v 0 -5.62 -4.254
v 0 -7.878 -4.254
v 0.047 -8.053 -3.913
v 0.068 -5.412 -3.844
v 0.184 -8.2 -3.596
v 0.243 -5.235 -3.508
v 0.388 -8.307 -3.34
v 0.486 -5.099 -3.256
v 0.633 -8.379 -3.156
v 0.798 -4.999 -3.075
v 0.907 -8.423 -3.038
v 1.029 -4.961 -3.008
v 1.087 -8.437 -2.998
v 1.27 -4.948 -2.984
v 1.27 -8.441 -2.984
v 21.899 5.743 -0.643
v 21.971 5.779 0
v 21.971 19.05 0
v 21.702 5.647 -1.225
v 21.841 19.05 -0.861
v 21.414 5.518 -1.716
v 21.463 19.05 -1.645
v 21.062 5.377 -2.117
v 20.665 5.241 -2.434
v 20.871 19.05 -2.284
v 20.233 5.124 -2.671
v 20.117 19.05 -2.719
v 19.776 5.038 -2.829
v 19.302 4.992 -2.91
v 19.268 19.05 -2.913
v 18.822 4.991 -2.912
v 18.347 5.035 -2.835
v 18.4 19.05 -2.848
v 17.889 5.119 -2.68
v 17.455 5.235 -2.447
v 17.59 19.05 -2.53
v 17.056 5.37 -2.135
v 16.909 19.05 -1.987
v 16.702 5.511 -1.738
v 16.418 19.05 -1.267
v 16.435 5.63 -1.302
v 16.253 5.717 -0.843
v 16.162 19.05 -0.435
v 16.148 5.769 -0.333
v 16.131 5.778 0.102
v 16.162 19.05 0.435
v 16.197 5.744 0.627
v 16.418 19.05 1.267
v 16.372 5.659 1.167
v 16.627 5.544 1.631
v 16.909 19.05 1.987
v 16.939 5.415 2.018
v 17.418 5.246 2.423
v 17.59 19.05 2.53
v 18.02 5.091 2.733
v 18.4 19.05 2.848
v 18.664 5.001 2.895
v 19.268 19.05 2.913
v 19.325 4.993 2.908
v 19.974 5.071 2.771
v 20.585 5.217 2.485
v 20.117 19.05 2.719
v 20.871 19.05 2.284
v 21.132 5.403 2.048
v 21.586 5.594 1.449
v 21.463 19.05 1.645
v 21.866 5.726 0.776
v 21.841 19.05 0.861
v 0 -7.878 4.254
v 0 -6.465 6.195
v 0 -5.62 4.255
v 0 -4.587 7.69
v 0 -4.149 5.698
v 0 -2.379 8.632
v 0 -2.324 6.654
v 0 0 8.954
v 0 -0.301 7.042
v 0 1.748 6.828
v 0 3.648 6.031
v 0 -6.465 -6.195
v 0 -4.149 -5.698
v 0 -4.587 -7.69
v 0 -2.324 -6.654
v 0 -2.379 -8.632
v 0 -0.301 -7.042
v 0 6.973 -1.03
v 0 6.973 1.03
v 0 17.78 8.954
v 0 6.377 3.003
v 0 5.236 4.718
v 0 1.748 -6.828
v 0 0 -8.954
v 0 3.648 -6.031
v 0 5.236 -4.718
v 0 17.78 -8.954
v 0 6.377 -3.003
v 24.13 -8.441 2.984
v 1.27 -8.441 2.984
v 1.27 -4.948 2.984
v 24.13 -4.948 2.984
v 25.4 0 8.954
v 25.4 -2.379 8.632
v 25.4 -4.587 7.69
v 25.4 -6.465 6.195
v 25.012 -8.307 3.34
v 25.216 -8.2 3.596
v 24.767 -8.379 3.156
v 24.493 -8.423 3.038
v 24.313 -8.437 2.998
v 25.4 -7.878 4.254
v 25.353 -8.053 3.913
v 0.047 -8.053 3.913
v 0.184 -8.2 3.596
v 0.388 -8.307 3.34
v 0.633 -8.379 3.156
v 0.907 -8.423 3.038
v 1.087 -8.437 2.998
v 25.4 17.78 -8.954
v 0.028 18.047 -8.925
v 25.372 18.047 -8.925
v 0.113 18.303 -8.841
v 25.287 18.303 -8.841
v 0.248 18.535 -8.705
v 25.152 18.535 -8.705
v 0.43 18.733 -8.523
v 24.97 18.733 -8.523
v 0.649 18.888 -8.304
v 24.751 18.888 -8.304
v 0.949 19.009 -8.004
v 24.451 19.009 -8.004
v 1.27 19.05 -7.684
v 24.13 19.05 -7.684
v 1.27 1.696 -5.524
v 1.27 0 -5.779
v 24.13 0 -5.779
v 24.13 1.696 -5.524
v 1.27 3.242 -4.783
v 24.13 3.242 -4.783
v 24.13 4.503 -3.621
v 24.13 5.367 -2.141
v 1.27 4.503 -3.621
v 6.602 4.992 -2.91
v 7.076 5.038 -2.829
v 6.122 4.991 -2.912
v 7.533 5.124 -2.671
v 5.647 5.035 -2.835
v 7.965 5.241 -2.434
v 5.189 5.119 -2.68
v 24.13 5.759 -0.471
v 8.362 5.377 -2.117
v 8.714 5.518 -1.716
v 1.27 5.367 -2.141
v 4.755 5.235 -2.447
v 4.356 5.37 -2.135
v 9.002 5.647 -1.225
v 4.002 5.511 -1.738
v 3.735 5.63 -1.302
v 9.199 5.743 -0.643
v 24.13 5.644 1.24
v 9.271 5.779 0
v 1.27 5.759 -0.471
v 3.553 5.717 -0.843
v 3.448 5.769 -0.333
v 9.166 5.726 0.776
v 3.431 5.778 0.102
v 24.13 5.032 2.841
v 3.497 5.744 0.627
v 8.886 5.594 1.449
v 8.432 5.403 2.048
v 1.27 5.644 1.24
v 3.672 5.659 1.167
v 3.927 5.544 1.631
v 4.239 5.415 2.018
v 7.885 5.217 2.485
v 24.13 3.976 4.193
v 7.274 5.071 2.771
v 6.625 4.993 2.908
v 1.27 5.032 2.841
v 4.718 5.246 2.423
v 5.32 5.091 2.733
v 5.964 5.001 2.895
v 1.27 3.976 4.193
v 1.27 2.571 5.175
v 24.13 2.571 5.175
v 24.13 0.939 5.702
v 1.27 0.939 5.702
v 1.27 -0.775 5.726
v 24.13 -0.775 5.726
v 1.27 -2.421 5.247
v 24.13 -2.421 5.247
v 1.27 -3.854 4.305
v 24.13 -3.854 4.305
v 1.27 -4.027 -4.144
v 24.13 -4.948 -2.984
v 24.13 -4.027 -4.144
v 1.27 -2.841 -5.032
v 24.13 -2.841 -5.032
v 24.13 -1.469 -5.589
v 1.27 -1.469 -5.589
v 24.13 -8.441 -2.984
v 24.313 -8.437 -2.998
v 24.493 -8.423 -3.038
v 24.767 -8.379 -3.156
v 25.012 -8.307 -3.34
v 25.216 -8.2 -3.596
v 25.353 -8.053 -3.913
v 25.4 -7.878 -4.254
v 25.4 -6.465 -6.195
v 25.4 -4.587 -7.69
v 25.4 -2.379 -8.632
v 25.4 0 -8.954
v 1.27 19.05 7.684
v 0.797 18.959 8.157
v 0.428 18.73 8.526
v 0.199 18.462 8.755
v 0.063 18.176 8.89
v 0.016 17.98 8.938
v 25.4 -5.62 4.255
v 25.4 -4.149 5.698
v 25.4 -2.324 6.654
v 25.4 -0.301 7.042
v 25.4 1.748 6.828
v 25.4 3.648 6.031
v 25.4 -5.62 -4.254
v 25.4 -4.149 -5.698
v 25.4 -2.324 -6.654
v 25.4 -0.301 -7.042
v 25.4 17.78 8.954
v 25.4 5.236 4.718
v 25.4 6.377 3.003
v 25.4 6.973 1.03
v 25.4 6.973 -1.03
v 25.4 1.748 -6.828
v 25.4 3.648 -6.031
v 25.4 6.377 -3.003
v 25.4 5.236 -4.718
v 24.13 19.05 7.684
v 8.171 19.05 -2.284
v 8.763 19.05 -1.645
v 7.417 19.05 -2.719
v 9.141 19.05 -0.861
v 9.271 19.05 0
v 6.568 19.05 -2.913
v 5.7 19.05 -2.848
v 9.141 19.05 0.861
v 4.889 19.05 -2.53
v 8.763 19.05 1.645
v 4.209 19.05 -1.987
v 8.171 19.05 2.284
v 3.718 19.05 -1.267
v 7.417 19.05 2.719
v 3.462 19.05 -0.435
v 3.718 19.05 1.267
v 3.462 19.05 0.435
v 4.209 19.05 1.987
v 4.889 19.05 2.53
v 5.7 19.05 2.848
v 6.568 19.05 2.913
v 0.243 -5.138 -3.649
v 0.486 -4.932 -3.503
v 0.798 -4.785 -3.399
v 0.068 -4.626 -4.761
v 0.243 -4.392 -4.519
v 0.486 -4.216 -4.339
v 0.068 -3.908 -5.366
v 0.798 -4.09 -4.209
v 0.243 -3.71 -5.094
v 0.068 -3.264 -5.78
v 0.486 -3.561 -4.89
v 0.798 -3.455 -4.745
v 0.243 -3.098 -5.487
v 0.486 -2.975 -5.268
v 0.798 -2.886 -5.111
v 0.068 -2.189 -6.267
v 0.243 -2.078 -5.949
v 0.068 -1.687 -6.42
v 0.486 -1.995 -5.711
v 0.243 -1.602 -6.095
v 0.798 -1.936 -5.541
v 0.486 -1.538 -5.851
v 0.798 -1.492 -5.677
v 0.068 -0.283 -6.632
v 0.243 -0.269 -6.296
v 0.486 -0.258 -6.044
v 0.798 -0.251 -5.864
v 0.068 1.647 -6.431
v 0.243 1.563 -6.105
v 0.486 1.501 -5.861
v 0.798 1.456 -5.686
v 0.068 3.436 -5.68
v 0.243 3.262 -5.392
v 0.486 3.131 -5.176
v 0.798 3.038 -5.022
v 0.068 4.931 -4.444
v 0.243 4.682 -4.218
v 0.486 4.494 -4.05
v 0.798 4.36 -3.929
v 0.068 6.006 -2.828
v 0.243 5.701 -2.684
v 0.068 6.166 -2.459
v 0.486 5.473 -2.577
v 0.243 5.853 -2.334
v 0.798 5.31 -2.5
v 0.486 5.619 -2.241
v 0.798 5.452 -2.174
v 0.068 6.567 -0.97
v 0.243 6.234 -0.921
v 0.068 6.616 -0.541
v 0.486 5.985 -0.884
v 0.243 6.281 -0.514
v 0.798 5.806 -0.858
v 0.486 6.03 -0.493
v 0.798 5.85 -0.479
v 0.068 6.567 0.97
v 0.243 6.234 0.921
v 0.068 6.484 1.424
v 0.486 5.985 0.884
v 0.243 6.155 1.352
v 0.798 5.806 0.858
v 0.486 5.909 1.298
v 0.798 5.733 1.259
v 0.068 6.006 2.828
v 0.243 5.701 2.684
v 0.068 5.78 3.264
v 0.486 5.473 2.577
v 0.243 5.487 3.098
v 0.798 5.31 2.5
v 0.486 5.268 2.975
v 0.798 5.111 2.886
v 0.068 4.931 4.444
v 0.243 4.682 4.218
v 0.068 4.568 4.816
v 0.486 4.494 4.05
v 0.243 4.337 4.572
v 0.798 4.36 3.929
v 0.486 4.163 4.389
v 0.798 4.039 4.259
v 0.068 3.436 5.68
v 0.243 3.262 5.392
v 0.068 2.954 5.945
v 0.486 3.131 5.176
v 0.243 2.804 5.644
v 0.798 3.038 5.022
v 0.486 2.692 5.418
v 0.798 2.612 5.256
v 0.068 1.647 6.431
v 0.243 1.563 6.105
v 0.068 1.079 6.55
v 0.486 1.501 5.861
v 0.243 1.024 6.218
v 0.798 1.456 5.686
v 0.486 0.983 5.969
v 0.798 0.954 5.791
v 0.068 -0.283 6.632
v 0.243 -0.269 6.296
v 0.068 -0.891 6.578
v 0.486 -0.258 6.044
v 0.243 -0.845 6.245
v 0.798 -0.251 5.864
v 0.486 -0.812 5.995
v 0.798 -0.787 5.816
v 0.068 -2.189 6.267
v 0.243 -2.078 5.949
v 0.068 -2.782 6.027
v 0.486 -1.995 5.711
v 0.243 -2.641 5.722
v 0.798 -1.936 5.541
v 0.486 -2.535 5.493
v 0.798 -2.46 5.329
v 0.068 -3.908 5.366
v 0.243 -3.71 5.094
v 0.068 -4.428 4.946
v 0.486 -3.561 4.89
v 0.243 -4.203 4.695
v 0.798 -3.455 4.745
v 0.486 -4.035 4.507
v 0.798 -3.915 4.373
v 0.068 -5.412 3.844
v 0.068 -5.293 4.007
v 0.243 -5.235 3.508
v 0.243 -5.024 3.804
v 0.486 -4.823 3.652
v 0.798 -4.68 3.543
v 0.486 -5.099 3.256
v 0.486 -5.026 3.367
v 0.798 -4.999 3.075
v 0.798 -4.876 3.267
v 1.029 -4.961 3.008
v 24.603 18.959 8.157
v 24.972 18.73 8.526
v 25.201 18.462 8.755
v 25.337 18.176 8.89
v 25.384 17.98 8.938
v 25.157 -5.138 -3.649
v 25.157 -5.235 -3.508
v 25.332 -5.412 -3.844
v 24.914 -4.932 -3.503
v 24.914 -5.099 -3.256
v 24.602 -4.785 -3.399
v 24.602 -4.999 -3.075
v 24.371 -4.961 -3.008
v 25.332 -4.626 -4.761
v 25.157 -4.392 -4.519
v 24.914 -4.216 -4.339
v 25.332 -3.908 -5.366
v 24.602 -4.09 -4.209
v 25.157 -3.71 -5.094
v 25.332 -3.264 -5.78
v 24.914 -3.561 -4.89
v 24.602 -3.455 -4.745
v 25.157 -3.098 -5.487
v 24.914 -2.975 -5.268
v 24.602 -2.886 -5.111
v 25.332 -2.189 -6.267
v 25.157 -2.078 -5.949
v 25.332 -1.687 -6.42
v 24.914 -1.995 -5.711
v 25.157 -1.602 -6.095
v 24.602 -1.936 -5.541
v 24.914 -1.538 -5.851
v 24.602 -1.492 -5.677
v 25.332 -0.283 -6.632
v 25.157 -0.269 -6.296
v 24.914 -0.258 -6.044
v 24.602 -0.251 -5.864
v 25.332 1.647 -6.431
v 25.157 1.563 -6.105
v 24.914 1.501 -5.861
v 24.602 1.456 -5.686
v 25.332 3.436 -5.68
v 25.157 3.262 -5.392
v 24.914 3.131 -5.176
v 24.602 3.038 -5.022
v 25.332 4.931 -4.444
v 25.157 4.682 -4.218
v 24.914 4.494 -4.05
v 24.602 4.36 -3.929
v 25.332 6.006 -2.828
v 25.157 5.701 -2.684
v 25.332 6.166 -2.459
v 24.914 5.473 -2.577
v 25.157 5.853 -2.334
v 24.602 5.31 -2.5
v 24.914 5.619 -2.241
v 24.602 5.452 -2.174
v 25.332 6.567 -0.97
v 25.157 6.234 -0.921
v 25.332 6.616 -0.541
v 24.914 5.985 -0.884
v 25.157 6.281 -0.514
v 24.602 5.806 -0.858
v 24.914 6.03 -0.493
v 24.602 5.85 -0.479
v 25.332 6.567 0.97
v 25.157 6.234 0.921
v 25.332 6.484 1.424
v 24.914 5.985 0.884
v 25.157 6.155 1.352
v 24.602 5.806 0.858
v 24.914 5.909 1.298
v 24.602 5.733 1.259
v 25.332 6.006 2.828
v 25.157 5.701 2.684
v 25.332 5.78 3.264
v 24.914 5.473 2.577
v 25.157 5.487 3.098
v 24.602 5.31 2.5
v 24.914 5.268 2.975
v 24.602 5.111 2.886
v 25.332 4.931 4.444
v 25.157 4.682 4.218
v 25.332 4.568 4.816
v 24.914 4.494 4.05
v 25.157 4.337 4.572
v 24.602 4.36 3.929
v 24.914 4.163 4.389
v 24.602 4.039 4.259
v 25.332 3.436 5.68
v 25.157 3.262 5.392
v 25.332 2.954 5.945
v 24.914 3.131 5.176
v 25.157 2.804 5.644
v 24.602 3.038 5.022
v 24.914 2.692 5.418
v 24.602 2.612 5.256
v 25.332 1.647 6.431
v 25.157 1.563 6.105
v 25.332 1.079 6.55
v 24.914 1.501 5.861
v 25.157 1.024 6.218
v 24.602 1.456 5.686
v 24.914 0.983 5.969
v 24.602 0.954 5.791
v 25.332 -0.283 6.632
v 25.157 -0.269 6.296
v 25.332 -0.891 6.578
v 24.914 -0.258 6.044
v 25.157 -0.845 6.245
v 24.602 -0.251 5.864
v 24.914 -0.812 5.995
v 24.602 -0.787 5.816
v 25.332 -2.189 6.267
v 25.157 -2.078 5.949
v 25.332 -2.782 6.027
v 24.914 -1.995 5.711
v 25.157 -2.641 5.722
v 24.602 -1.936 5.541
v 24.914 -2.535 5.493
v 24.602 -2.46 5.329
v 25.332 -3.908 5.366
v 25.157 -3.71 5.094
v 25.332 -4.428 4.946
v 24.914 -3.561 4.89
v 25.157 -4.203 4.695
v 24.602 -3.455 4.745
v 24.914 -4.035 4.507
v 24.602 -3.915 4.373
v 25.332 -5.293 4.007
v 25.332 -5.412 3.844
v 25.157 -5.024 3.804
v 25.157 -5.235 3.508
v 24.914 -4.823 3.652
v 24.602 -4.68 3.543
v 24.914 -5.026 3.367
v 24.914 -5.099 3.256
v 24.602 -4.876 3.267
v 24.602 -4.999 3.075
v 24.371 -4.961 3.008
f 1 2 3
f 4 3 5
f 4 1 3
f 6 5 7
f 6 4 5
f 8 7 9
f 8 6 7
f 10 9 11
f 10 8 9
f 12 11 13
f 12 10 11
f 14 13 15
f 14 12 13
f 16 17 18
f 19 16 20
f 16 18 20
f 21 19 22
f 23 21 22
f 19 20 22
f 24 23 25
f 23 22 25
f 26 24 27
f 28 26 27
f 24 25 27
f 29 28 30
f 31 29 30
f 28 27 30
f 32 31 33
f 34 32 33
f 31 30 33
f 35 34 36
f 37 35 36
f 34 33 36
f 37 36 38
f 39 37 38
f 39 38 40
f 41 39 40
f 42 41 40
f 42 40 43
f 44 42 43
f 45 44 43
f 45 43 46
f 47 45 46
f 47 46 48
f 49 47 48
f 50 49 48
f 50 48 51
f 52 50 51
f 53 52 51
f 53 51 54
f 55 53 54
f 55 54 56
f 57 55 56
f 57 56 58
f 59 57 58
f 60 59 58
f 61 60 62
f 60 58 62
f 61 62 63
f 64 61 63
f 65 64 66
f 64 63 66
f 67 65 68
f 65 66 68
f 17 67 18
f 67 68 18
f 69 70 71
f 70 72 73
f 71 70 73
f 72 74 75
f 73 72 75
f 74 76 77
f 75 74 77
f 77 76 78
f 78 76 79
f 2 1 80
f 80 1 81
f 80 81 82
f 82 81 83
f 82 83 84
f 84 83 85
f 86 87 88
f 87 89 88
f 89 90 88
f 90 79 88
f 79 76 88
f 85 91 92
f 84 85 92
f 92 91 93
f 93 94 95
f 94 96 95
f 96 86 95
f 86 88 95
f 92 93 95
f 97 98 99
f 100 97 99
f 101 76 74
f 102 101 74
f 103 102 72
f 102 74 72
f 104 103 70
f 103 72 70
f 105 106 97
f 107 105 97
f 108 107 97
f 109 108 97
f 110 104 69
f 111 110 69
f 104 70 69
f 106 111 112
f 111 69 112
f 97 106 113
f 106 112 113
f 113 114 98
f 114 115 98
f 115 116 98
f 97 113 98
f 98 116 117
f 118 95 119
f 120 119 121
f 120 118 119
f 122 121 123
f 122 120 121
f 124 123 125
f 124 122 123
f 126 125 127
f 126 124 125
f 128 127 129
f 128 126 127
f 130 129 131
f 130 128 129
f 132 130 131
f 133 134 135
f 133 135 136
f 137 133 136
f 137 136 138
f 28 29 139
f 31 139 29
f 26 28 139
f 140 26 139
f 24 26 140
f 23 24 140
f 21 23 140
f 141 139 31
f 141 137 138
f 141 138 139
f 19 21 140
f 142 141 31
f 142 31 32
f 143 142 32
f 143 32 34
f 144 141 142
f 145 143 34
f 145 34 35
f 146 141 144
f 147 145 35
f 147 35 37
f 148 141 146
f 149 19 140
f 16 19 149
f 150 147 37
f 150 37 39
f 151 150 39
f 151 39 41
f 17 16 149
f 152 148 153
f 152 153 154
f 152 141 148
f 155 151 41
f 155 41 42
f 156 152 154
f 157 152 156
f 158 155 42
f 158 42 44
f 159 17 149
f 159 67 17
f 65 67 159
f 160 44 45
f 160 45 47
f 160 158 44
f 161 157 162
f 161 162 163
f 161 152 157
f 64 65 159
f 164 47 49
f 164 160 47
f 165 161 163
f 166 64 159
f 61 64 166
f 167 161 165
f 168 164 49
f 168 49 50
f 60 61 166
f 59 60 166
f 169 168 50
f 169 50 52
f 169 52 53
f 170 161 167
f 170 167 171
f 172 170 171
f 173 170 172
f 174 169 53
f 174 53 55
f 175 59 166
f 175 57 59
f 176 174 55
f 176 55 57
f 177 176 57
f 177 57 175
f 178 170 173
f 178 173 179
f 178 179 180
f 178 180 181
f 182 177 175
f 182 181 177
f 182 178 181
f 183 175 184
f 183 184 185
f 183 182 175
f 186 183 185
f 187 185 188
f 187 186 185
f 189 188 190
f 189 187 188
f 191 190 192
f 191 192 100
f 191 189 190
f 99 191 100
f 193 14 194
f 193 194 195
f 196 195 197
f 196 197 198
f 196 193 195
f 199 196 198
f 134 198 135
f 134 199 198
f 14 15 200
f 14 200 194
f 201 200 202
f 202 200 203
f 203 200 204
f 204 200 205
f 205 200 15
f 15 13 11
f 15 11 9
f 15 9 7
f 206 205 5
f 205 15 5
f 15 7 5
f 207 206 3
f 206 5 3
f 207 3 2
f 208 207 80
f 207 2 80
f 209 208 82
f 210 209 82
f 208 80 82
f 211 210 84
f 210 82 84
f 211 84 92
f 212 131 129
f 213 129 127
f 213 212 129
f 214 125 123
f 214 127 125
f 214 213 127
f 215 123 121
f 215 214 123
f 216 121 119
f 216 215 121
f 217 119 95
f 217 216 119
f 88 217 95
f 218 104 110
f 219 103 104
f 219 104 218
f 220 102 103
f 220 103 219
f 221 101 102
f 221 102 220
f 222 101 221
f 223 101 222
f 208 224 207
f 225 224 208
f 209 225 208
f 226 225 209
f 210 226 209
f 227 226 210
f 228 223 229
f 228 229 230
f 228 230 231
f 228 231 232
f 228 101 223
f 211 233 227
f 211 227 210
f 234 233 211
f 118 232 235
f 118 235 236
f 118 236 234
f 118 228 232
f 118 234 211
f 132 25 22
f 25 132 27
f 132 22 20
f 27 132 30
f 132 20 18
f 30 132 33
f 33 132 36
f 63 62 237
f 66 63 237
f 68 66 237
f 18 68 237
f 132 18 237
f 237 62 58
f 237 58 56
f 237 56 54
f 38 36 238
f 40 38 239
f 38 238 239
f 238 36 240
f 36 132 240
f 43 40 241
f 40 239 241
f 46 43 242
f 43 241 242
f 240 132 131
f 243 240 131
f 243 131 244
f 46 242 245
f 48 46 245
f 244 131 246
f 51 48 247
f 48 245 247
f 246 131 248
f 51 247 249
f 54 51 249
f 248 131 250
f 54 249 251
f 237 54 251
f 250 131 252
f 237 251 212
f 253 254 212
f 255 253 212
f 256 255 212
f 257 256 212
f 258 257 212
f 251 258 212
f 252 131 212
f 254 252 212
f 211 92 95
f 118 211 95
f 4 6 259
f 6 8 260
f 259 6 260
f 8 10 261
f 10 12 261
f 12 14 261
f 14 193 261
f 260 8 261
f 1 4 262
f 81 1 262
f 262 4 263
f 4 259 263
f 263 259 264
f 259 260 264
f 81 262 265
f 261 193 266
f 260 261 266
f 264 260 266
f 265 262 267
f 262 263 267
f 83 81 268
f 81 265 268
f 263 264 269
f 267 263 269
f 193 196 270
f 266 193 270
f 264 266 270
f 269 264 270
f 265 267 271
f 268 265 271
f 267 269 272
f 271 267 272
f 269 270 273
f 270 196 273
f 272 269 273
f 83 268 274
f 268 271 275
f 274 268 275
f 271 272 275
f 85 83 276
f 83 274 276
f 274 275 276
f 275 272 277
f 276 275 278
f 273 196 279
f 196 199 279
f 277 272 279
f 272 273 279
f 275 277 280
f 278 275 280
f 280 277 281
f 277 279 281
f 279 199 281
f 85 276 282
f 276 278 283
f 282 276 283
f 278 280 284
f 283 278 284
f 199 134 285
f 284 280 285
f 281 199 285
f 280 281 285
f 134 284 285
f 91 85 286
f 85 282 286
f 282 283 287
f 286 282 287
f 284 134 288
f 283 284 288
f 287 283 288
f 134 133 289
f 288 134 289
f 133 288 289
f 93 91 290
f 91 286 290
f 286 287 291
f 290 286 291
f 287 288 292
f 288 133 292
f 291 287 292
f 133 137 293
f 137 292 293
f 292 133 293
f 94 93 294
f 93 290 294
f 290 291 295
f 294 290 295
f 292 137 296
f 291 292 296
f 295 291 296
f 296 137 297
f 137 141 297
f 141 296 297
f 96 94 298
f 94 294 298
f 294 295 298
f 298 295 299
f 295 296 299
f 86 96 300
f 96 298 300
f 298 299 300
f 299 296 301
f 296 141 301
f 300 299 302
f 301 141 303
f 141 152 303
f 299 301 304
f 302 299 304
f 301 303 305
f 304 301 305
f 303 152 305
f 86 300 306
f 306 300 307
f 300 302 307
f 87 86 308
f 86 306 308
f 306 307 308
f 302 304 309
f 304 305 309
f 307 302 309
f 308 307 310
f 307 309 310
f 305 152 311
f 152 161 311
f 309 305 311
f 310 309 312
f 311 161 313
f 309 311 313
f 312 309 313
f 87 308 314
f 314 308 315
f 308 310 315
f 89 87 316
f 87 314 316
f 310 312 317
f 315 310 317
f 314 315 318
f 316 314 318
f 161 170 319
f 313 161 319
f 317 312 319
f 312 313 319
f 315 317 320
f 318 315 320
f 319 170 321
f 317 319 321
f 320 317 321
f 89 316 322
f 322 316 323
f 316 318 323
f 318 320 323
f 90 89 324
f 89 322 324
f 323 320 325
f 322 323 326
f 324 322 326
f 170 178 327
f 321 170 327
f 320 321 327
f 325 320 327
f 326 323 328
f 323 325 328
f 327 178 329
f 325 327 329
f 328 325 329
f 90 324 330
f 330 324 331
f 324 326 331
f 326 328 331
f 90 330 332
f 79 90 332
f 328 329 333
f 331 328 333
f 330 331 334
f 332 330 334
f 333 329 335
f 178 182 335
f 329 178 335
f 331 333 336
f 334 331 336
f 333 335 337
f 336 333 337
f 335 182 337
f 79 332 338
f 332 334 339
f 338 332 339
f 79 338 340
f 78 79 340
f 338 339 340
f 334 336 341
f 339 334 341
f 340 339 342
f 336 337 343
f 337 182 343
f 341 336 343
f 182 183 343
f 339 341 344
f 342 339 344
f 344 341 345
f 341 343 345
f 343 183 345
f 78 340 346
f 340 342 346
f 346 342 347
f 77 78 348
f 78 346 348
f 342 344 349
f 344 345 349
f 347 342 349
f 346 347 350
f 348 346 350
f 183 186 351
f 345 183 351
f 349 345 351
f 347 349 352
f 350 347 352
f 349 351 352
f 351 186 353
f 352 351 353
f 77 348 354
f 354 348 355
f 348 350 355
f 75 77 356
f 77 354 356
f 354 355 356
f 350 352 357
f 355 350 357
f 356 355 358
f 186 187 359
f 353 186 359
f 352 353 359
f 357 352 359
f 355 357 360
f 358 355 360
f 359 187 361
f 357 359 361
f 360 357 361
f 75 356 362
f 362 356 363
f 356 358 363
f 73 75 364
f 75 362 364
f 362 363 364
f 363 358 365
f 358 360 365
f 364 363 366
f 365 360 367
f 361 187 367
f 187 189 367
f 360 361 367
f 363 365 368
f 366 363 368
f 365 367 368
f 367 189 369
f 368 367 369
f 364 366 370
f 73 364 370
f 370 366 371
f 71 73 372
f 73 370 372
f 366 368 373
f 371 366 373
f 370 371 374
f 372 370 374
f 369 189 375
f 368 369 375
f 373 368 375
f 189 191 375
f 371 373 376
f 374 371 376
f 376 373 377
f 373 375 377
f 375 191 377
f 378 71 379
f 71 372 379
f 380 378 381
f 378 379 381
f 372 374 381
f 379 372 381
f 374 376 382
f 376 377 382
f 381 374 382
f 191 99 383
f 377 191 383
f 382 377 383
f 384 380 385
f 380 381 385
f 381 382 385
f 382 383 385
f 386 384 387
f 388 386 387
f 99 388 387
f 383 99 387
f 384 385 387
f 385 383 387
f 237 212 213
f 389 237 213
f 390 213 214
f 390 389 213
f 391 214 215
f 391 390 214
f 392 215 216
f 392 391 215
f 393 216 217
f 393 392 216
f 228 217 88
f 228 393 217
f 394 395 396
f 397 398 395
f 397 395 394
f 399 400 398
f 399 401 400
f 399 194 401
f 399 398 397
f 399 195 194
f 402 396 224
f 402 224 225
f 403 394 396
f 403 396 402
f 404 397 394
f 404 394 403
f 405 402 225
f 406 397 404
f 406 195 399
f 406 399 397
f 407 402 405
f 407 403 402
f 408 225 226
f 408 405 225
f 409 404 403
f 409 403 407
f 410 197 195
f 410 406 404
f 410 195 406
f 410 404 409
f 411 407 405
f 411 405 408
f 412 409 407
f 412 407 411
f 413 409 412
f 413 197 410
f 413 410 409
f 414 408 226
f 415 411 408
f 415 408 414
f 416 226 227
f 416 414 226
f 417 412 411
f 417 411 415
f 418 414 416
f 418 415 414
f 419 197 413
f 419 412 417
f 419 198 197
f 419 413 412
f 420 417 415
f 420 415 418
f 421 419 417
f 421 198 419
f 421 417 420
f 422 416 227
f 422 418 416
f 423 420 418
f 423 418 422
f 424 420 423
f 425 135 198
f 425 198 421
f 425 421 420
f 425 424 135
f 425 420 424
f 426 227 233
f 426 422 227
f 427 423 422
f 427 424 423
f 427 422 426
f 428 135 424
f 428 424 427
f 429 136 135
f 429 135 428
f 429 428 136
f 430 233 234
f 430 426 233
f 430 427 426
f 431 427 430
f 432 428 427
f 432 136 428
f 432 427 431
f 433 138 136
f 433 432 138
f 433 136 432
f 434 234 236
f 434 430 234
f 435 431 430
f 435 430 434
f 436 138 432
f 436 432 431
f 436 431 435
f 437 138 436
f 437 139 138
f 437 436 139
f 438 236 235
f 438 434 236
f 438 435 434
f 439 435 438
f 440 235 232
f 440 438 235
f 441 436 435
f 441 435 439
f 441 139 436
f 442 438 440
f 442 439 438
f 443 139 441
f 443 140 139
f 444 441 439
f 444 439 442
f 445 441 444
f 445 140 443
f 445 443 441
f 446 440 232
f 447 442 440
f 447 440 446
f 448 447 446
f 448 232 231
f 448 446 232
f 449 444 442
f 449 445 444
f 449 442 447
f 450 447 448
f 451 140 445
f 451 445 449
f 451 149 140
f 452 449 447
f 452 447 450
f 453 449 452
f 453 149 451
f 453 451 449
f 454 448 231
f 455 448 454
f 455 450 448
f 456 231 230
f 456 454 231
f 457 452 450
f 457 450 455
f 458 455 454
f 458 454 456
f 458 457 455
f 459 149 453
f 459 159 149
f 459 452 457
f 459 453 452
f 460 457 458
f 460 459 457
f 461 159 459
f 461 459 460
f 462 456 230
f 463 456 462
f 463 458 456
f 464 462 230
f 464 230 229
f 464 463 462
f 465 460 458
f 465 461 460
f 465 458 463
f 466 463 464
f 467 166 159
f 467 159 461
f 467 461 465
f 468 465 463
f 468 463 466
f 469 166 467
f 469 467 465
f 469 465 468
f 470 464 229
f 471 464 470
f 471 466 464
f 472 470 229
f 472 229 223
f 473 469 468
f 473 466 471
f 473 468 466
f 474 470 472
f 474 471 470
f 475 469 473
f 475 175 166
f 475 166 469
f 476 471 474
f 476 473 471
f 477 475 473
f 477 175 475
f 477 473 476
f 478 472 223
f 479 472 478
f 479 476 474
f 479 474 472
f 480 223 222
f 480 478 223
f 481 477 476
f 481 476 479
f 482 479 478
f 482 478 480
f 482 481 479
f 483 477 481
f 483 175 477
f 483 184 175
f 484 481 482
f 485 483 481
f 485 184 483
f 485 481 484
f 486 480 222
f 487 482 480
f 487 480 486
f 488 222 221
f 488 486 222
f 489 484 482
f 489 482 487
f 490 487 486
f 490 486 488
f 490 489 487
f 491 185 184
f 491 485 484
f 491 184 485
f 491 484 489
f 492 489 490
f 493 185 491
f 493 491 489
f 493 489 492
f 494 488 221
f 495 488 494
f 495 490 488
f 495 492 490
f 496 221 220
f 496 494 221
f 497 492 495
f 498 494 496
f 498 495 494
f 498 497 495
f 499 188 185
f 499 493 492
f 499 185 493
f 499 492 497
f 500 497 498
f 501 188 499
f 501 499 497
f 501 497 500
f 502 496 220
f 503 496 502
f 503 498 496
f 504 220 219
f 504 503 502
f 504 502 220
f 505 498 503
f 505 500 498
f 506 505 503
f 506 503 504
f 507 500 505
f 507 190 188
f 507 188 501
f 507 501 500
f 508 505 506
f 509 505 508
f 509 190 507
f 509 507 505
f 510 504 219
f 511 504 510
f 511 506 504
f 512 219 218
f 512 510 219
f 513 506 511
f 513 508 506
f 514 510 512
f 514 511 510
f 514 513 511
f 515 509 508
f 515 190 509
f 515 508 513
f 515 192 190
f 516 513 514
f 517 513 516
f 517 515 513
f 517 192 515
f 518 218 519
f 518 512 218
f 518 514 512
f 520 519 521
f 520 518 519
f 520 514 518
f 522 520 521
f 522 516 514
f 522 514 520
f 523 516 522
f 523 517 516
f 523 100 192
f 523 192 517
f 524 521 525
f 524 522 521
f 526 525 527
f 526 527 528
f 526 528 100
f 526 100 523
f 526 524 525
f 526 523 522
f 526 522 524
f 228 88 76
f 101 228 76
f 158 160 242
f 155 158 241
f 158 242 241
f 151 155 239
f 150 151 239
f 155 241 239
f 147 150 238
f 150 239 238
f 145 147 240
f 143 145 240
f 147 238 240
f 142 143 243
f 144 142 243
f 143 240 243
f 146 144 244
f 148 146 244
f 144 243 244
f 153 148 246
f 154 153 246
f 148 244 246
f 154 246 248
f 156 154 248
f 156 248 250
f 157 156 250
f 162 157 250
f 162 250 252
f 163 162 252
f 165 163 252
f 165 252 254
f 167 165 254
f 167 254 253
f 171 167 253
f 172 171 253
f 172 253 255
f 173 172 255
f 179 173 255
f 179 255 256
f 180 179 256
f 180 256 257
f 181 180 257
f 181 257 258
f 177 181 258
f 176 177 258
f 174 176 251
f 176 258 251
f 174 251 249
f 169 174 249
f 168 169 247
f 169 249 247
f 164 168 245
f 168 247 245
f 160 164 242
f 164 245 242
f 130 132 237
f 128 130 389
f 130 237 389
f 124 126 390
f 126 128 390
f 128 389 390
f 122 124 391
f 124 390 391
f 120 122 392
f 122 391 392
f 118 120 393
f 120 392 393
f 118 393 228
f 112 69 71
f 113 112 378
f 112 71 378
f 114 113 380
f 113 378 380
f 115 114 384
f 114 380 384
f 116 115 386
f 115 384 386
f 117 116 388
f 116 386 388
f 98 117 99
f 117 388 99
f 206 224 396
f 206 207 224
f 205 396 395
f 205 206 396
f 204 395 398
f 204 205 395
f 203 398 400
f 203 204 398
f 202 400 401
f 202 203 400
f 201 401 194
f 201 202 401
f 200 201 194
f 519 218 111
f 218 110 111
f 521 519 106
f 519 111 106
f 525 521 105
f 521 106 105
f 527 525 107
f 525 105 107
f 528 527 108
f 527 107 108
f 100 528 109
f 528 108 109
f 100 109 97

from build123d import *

# Parameters (mm, degrees)
SKETCH1_R           = 5.7785
BOSS_EXTRUDE1_DEPTH = 25.4
SKETCH2_R           = 2.921
CUT_EXTRUDE1_DEPTH  = 27.513623
SKETCH3_W           = 5.969
SKETCH3_H           = 4.005387026
CUT_EXTRUDE2_DEPTH  = 26.4000001
FILLET1_R           = 1.27
FILLET2_R           = 1.27


with BuildPart() as part:
    # Sketch1 → Boss-Extrude1 (new body)
    with BuildSketch(Plane(origin=(0, 0, 0), x_dir=(0, 0, -1), z_dir=(1, 0, 0))):
        with BuildLine():
            Line((-8.9535, 19.05), (-8.9535, 0))
            ThreePointArc((-8.9535, 0), (0, -8.9535), (8.9535, 0))
            Line((8.9535, 0), (8.9535, 19.05))
            Line((8.9535, 19.05), (-8.9535, 19.05))
        make_face()
        Circle(SKETCH1_R, mode=Mode.SUBTRACT)
    extrude(amount=BOSS_EXTRUDE1_DEPTH)

    # Sketch2 → Cut-Extrude1 (cut)
    with BuildSketch(Plane(origin=(0, 19.05, 0), x_dir=(1, 0, 0), z_dir=(0, 1, 0))):
        with Locations((6.35, 0)):
            Circle(SKETCH2_R)
        with Locations((19.05, 0)):
            Circle(SKETCH2_R)
    extrude(amount=-CUT_EXTRUDE1_DEPTH, mode=Mode.SUBTRACT)

    # Sketch3 → Cut-Extrude2 (cut, through all)
    with BuildSketch(Plane.ZY):
        with Locations((0, -6.950806487)):
            Rectangle(SKETCH3_W, SKETCH3_H)
    extrude(amount=-CUT_EXTRUDE2_DEPTH, mode=Mode.SUBTRACT)

    # Fillet1
    fillet1_edges = [part.edges().sort_by_distance(p)[0] for p in [
        (0, 5.031748975, 2.84122588),
        (0, -6.694776864, 2.9845),
        (25.4, 5.031748975, 2.84122588),
        (0, -6.694776864, -2.9845),
        (25.4, -6.694776864, -2.9845),
        (25.4, -6.694776864, 2.9845),
    ]]
    fillet(fillet1_edges, radius=FILLET1_R)

    # Fillet2
    fillet2_edges = [part.edges().sort_by_distance(p)[0] for p in [
        (12.7, 19.05, 8.9535),
        (12.7, 19.05, -8.9535),
        (25.4, 19.05, 0),
        (0, 19.05, 0),
    ]]
    fillet(fillet2_edges, radius=FILLET2_R)


solid = part.part
